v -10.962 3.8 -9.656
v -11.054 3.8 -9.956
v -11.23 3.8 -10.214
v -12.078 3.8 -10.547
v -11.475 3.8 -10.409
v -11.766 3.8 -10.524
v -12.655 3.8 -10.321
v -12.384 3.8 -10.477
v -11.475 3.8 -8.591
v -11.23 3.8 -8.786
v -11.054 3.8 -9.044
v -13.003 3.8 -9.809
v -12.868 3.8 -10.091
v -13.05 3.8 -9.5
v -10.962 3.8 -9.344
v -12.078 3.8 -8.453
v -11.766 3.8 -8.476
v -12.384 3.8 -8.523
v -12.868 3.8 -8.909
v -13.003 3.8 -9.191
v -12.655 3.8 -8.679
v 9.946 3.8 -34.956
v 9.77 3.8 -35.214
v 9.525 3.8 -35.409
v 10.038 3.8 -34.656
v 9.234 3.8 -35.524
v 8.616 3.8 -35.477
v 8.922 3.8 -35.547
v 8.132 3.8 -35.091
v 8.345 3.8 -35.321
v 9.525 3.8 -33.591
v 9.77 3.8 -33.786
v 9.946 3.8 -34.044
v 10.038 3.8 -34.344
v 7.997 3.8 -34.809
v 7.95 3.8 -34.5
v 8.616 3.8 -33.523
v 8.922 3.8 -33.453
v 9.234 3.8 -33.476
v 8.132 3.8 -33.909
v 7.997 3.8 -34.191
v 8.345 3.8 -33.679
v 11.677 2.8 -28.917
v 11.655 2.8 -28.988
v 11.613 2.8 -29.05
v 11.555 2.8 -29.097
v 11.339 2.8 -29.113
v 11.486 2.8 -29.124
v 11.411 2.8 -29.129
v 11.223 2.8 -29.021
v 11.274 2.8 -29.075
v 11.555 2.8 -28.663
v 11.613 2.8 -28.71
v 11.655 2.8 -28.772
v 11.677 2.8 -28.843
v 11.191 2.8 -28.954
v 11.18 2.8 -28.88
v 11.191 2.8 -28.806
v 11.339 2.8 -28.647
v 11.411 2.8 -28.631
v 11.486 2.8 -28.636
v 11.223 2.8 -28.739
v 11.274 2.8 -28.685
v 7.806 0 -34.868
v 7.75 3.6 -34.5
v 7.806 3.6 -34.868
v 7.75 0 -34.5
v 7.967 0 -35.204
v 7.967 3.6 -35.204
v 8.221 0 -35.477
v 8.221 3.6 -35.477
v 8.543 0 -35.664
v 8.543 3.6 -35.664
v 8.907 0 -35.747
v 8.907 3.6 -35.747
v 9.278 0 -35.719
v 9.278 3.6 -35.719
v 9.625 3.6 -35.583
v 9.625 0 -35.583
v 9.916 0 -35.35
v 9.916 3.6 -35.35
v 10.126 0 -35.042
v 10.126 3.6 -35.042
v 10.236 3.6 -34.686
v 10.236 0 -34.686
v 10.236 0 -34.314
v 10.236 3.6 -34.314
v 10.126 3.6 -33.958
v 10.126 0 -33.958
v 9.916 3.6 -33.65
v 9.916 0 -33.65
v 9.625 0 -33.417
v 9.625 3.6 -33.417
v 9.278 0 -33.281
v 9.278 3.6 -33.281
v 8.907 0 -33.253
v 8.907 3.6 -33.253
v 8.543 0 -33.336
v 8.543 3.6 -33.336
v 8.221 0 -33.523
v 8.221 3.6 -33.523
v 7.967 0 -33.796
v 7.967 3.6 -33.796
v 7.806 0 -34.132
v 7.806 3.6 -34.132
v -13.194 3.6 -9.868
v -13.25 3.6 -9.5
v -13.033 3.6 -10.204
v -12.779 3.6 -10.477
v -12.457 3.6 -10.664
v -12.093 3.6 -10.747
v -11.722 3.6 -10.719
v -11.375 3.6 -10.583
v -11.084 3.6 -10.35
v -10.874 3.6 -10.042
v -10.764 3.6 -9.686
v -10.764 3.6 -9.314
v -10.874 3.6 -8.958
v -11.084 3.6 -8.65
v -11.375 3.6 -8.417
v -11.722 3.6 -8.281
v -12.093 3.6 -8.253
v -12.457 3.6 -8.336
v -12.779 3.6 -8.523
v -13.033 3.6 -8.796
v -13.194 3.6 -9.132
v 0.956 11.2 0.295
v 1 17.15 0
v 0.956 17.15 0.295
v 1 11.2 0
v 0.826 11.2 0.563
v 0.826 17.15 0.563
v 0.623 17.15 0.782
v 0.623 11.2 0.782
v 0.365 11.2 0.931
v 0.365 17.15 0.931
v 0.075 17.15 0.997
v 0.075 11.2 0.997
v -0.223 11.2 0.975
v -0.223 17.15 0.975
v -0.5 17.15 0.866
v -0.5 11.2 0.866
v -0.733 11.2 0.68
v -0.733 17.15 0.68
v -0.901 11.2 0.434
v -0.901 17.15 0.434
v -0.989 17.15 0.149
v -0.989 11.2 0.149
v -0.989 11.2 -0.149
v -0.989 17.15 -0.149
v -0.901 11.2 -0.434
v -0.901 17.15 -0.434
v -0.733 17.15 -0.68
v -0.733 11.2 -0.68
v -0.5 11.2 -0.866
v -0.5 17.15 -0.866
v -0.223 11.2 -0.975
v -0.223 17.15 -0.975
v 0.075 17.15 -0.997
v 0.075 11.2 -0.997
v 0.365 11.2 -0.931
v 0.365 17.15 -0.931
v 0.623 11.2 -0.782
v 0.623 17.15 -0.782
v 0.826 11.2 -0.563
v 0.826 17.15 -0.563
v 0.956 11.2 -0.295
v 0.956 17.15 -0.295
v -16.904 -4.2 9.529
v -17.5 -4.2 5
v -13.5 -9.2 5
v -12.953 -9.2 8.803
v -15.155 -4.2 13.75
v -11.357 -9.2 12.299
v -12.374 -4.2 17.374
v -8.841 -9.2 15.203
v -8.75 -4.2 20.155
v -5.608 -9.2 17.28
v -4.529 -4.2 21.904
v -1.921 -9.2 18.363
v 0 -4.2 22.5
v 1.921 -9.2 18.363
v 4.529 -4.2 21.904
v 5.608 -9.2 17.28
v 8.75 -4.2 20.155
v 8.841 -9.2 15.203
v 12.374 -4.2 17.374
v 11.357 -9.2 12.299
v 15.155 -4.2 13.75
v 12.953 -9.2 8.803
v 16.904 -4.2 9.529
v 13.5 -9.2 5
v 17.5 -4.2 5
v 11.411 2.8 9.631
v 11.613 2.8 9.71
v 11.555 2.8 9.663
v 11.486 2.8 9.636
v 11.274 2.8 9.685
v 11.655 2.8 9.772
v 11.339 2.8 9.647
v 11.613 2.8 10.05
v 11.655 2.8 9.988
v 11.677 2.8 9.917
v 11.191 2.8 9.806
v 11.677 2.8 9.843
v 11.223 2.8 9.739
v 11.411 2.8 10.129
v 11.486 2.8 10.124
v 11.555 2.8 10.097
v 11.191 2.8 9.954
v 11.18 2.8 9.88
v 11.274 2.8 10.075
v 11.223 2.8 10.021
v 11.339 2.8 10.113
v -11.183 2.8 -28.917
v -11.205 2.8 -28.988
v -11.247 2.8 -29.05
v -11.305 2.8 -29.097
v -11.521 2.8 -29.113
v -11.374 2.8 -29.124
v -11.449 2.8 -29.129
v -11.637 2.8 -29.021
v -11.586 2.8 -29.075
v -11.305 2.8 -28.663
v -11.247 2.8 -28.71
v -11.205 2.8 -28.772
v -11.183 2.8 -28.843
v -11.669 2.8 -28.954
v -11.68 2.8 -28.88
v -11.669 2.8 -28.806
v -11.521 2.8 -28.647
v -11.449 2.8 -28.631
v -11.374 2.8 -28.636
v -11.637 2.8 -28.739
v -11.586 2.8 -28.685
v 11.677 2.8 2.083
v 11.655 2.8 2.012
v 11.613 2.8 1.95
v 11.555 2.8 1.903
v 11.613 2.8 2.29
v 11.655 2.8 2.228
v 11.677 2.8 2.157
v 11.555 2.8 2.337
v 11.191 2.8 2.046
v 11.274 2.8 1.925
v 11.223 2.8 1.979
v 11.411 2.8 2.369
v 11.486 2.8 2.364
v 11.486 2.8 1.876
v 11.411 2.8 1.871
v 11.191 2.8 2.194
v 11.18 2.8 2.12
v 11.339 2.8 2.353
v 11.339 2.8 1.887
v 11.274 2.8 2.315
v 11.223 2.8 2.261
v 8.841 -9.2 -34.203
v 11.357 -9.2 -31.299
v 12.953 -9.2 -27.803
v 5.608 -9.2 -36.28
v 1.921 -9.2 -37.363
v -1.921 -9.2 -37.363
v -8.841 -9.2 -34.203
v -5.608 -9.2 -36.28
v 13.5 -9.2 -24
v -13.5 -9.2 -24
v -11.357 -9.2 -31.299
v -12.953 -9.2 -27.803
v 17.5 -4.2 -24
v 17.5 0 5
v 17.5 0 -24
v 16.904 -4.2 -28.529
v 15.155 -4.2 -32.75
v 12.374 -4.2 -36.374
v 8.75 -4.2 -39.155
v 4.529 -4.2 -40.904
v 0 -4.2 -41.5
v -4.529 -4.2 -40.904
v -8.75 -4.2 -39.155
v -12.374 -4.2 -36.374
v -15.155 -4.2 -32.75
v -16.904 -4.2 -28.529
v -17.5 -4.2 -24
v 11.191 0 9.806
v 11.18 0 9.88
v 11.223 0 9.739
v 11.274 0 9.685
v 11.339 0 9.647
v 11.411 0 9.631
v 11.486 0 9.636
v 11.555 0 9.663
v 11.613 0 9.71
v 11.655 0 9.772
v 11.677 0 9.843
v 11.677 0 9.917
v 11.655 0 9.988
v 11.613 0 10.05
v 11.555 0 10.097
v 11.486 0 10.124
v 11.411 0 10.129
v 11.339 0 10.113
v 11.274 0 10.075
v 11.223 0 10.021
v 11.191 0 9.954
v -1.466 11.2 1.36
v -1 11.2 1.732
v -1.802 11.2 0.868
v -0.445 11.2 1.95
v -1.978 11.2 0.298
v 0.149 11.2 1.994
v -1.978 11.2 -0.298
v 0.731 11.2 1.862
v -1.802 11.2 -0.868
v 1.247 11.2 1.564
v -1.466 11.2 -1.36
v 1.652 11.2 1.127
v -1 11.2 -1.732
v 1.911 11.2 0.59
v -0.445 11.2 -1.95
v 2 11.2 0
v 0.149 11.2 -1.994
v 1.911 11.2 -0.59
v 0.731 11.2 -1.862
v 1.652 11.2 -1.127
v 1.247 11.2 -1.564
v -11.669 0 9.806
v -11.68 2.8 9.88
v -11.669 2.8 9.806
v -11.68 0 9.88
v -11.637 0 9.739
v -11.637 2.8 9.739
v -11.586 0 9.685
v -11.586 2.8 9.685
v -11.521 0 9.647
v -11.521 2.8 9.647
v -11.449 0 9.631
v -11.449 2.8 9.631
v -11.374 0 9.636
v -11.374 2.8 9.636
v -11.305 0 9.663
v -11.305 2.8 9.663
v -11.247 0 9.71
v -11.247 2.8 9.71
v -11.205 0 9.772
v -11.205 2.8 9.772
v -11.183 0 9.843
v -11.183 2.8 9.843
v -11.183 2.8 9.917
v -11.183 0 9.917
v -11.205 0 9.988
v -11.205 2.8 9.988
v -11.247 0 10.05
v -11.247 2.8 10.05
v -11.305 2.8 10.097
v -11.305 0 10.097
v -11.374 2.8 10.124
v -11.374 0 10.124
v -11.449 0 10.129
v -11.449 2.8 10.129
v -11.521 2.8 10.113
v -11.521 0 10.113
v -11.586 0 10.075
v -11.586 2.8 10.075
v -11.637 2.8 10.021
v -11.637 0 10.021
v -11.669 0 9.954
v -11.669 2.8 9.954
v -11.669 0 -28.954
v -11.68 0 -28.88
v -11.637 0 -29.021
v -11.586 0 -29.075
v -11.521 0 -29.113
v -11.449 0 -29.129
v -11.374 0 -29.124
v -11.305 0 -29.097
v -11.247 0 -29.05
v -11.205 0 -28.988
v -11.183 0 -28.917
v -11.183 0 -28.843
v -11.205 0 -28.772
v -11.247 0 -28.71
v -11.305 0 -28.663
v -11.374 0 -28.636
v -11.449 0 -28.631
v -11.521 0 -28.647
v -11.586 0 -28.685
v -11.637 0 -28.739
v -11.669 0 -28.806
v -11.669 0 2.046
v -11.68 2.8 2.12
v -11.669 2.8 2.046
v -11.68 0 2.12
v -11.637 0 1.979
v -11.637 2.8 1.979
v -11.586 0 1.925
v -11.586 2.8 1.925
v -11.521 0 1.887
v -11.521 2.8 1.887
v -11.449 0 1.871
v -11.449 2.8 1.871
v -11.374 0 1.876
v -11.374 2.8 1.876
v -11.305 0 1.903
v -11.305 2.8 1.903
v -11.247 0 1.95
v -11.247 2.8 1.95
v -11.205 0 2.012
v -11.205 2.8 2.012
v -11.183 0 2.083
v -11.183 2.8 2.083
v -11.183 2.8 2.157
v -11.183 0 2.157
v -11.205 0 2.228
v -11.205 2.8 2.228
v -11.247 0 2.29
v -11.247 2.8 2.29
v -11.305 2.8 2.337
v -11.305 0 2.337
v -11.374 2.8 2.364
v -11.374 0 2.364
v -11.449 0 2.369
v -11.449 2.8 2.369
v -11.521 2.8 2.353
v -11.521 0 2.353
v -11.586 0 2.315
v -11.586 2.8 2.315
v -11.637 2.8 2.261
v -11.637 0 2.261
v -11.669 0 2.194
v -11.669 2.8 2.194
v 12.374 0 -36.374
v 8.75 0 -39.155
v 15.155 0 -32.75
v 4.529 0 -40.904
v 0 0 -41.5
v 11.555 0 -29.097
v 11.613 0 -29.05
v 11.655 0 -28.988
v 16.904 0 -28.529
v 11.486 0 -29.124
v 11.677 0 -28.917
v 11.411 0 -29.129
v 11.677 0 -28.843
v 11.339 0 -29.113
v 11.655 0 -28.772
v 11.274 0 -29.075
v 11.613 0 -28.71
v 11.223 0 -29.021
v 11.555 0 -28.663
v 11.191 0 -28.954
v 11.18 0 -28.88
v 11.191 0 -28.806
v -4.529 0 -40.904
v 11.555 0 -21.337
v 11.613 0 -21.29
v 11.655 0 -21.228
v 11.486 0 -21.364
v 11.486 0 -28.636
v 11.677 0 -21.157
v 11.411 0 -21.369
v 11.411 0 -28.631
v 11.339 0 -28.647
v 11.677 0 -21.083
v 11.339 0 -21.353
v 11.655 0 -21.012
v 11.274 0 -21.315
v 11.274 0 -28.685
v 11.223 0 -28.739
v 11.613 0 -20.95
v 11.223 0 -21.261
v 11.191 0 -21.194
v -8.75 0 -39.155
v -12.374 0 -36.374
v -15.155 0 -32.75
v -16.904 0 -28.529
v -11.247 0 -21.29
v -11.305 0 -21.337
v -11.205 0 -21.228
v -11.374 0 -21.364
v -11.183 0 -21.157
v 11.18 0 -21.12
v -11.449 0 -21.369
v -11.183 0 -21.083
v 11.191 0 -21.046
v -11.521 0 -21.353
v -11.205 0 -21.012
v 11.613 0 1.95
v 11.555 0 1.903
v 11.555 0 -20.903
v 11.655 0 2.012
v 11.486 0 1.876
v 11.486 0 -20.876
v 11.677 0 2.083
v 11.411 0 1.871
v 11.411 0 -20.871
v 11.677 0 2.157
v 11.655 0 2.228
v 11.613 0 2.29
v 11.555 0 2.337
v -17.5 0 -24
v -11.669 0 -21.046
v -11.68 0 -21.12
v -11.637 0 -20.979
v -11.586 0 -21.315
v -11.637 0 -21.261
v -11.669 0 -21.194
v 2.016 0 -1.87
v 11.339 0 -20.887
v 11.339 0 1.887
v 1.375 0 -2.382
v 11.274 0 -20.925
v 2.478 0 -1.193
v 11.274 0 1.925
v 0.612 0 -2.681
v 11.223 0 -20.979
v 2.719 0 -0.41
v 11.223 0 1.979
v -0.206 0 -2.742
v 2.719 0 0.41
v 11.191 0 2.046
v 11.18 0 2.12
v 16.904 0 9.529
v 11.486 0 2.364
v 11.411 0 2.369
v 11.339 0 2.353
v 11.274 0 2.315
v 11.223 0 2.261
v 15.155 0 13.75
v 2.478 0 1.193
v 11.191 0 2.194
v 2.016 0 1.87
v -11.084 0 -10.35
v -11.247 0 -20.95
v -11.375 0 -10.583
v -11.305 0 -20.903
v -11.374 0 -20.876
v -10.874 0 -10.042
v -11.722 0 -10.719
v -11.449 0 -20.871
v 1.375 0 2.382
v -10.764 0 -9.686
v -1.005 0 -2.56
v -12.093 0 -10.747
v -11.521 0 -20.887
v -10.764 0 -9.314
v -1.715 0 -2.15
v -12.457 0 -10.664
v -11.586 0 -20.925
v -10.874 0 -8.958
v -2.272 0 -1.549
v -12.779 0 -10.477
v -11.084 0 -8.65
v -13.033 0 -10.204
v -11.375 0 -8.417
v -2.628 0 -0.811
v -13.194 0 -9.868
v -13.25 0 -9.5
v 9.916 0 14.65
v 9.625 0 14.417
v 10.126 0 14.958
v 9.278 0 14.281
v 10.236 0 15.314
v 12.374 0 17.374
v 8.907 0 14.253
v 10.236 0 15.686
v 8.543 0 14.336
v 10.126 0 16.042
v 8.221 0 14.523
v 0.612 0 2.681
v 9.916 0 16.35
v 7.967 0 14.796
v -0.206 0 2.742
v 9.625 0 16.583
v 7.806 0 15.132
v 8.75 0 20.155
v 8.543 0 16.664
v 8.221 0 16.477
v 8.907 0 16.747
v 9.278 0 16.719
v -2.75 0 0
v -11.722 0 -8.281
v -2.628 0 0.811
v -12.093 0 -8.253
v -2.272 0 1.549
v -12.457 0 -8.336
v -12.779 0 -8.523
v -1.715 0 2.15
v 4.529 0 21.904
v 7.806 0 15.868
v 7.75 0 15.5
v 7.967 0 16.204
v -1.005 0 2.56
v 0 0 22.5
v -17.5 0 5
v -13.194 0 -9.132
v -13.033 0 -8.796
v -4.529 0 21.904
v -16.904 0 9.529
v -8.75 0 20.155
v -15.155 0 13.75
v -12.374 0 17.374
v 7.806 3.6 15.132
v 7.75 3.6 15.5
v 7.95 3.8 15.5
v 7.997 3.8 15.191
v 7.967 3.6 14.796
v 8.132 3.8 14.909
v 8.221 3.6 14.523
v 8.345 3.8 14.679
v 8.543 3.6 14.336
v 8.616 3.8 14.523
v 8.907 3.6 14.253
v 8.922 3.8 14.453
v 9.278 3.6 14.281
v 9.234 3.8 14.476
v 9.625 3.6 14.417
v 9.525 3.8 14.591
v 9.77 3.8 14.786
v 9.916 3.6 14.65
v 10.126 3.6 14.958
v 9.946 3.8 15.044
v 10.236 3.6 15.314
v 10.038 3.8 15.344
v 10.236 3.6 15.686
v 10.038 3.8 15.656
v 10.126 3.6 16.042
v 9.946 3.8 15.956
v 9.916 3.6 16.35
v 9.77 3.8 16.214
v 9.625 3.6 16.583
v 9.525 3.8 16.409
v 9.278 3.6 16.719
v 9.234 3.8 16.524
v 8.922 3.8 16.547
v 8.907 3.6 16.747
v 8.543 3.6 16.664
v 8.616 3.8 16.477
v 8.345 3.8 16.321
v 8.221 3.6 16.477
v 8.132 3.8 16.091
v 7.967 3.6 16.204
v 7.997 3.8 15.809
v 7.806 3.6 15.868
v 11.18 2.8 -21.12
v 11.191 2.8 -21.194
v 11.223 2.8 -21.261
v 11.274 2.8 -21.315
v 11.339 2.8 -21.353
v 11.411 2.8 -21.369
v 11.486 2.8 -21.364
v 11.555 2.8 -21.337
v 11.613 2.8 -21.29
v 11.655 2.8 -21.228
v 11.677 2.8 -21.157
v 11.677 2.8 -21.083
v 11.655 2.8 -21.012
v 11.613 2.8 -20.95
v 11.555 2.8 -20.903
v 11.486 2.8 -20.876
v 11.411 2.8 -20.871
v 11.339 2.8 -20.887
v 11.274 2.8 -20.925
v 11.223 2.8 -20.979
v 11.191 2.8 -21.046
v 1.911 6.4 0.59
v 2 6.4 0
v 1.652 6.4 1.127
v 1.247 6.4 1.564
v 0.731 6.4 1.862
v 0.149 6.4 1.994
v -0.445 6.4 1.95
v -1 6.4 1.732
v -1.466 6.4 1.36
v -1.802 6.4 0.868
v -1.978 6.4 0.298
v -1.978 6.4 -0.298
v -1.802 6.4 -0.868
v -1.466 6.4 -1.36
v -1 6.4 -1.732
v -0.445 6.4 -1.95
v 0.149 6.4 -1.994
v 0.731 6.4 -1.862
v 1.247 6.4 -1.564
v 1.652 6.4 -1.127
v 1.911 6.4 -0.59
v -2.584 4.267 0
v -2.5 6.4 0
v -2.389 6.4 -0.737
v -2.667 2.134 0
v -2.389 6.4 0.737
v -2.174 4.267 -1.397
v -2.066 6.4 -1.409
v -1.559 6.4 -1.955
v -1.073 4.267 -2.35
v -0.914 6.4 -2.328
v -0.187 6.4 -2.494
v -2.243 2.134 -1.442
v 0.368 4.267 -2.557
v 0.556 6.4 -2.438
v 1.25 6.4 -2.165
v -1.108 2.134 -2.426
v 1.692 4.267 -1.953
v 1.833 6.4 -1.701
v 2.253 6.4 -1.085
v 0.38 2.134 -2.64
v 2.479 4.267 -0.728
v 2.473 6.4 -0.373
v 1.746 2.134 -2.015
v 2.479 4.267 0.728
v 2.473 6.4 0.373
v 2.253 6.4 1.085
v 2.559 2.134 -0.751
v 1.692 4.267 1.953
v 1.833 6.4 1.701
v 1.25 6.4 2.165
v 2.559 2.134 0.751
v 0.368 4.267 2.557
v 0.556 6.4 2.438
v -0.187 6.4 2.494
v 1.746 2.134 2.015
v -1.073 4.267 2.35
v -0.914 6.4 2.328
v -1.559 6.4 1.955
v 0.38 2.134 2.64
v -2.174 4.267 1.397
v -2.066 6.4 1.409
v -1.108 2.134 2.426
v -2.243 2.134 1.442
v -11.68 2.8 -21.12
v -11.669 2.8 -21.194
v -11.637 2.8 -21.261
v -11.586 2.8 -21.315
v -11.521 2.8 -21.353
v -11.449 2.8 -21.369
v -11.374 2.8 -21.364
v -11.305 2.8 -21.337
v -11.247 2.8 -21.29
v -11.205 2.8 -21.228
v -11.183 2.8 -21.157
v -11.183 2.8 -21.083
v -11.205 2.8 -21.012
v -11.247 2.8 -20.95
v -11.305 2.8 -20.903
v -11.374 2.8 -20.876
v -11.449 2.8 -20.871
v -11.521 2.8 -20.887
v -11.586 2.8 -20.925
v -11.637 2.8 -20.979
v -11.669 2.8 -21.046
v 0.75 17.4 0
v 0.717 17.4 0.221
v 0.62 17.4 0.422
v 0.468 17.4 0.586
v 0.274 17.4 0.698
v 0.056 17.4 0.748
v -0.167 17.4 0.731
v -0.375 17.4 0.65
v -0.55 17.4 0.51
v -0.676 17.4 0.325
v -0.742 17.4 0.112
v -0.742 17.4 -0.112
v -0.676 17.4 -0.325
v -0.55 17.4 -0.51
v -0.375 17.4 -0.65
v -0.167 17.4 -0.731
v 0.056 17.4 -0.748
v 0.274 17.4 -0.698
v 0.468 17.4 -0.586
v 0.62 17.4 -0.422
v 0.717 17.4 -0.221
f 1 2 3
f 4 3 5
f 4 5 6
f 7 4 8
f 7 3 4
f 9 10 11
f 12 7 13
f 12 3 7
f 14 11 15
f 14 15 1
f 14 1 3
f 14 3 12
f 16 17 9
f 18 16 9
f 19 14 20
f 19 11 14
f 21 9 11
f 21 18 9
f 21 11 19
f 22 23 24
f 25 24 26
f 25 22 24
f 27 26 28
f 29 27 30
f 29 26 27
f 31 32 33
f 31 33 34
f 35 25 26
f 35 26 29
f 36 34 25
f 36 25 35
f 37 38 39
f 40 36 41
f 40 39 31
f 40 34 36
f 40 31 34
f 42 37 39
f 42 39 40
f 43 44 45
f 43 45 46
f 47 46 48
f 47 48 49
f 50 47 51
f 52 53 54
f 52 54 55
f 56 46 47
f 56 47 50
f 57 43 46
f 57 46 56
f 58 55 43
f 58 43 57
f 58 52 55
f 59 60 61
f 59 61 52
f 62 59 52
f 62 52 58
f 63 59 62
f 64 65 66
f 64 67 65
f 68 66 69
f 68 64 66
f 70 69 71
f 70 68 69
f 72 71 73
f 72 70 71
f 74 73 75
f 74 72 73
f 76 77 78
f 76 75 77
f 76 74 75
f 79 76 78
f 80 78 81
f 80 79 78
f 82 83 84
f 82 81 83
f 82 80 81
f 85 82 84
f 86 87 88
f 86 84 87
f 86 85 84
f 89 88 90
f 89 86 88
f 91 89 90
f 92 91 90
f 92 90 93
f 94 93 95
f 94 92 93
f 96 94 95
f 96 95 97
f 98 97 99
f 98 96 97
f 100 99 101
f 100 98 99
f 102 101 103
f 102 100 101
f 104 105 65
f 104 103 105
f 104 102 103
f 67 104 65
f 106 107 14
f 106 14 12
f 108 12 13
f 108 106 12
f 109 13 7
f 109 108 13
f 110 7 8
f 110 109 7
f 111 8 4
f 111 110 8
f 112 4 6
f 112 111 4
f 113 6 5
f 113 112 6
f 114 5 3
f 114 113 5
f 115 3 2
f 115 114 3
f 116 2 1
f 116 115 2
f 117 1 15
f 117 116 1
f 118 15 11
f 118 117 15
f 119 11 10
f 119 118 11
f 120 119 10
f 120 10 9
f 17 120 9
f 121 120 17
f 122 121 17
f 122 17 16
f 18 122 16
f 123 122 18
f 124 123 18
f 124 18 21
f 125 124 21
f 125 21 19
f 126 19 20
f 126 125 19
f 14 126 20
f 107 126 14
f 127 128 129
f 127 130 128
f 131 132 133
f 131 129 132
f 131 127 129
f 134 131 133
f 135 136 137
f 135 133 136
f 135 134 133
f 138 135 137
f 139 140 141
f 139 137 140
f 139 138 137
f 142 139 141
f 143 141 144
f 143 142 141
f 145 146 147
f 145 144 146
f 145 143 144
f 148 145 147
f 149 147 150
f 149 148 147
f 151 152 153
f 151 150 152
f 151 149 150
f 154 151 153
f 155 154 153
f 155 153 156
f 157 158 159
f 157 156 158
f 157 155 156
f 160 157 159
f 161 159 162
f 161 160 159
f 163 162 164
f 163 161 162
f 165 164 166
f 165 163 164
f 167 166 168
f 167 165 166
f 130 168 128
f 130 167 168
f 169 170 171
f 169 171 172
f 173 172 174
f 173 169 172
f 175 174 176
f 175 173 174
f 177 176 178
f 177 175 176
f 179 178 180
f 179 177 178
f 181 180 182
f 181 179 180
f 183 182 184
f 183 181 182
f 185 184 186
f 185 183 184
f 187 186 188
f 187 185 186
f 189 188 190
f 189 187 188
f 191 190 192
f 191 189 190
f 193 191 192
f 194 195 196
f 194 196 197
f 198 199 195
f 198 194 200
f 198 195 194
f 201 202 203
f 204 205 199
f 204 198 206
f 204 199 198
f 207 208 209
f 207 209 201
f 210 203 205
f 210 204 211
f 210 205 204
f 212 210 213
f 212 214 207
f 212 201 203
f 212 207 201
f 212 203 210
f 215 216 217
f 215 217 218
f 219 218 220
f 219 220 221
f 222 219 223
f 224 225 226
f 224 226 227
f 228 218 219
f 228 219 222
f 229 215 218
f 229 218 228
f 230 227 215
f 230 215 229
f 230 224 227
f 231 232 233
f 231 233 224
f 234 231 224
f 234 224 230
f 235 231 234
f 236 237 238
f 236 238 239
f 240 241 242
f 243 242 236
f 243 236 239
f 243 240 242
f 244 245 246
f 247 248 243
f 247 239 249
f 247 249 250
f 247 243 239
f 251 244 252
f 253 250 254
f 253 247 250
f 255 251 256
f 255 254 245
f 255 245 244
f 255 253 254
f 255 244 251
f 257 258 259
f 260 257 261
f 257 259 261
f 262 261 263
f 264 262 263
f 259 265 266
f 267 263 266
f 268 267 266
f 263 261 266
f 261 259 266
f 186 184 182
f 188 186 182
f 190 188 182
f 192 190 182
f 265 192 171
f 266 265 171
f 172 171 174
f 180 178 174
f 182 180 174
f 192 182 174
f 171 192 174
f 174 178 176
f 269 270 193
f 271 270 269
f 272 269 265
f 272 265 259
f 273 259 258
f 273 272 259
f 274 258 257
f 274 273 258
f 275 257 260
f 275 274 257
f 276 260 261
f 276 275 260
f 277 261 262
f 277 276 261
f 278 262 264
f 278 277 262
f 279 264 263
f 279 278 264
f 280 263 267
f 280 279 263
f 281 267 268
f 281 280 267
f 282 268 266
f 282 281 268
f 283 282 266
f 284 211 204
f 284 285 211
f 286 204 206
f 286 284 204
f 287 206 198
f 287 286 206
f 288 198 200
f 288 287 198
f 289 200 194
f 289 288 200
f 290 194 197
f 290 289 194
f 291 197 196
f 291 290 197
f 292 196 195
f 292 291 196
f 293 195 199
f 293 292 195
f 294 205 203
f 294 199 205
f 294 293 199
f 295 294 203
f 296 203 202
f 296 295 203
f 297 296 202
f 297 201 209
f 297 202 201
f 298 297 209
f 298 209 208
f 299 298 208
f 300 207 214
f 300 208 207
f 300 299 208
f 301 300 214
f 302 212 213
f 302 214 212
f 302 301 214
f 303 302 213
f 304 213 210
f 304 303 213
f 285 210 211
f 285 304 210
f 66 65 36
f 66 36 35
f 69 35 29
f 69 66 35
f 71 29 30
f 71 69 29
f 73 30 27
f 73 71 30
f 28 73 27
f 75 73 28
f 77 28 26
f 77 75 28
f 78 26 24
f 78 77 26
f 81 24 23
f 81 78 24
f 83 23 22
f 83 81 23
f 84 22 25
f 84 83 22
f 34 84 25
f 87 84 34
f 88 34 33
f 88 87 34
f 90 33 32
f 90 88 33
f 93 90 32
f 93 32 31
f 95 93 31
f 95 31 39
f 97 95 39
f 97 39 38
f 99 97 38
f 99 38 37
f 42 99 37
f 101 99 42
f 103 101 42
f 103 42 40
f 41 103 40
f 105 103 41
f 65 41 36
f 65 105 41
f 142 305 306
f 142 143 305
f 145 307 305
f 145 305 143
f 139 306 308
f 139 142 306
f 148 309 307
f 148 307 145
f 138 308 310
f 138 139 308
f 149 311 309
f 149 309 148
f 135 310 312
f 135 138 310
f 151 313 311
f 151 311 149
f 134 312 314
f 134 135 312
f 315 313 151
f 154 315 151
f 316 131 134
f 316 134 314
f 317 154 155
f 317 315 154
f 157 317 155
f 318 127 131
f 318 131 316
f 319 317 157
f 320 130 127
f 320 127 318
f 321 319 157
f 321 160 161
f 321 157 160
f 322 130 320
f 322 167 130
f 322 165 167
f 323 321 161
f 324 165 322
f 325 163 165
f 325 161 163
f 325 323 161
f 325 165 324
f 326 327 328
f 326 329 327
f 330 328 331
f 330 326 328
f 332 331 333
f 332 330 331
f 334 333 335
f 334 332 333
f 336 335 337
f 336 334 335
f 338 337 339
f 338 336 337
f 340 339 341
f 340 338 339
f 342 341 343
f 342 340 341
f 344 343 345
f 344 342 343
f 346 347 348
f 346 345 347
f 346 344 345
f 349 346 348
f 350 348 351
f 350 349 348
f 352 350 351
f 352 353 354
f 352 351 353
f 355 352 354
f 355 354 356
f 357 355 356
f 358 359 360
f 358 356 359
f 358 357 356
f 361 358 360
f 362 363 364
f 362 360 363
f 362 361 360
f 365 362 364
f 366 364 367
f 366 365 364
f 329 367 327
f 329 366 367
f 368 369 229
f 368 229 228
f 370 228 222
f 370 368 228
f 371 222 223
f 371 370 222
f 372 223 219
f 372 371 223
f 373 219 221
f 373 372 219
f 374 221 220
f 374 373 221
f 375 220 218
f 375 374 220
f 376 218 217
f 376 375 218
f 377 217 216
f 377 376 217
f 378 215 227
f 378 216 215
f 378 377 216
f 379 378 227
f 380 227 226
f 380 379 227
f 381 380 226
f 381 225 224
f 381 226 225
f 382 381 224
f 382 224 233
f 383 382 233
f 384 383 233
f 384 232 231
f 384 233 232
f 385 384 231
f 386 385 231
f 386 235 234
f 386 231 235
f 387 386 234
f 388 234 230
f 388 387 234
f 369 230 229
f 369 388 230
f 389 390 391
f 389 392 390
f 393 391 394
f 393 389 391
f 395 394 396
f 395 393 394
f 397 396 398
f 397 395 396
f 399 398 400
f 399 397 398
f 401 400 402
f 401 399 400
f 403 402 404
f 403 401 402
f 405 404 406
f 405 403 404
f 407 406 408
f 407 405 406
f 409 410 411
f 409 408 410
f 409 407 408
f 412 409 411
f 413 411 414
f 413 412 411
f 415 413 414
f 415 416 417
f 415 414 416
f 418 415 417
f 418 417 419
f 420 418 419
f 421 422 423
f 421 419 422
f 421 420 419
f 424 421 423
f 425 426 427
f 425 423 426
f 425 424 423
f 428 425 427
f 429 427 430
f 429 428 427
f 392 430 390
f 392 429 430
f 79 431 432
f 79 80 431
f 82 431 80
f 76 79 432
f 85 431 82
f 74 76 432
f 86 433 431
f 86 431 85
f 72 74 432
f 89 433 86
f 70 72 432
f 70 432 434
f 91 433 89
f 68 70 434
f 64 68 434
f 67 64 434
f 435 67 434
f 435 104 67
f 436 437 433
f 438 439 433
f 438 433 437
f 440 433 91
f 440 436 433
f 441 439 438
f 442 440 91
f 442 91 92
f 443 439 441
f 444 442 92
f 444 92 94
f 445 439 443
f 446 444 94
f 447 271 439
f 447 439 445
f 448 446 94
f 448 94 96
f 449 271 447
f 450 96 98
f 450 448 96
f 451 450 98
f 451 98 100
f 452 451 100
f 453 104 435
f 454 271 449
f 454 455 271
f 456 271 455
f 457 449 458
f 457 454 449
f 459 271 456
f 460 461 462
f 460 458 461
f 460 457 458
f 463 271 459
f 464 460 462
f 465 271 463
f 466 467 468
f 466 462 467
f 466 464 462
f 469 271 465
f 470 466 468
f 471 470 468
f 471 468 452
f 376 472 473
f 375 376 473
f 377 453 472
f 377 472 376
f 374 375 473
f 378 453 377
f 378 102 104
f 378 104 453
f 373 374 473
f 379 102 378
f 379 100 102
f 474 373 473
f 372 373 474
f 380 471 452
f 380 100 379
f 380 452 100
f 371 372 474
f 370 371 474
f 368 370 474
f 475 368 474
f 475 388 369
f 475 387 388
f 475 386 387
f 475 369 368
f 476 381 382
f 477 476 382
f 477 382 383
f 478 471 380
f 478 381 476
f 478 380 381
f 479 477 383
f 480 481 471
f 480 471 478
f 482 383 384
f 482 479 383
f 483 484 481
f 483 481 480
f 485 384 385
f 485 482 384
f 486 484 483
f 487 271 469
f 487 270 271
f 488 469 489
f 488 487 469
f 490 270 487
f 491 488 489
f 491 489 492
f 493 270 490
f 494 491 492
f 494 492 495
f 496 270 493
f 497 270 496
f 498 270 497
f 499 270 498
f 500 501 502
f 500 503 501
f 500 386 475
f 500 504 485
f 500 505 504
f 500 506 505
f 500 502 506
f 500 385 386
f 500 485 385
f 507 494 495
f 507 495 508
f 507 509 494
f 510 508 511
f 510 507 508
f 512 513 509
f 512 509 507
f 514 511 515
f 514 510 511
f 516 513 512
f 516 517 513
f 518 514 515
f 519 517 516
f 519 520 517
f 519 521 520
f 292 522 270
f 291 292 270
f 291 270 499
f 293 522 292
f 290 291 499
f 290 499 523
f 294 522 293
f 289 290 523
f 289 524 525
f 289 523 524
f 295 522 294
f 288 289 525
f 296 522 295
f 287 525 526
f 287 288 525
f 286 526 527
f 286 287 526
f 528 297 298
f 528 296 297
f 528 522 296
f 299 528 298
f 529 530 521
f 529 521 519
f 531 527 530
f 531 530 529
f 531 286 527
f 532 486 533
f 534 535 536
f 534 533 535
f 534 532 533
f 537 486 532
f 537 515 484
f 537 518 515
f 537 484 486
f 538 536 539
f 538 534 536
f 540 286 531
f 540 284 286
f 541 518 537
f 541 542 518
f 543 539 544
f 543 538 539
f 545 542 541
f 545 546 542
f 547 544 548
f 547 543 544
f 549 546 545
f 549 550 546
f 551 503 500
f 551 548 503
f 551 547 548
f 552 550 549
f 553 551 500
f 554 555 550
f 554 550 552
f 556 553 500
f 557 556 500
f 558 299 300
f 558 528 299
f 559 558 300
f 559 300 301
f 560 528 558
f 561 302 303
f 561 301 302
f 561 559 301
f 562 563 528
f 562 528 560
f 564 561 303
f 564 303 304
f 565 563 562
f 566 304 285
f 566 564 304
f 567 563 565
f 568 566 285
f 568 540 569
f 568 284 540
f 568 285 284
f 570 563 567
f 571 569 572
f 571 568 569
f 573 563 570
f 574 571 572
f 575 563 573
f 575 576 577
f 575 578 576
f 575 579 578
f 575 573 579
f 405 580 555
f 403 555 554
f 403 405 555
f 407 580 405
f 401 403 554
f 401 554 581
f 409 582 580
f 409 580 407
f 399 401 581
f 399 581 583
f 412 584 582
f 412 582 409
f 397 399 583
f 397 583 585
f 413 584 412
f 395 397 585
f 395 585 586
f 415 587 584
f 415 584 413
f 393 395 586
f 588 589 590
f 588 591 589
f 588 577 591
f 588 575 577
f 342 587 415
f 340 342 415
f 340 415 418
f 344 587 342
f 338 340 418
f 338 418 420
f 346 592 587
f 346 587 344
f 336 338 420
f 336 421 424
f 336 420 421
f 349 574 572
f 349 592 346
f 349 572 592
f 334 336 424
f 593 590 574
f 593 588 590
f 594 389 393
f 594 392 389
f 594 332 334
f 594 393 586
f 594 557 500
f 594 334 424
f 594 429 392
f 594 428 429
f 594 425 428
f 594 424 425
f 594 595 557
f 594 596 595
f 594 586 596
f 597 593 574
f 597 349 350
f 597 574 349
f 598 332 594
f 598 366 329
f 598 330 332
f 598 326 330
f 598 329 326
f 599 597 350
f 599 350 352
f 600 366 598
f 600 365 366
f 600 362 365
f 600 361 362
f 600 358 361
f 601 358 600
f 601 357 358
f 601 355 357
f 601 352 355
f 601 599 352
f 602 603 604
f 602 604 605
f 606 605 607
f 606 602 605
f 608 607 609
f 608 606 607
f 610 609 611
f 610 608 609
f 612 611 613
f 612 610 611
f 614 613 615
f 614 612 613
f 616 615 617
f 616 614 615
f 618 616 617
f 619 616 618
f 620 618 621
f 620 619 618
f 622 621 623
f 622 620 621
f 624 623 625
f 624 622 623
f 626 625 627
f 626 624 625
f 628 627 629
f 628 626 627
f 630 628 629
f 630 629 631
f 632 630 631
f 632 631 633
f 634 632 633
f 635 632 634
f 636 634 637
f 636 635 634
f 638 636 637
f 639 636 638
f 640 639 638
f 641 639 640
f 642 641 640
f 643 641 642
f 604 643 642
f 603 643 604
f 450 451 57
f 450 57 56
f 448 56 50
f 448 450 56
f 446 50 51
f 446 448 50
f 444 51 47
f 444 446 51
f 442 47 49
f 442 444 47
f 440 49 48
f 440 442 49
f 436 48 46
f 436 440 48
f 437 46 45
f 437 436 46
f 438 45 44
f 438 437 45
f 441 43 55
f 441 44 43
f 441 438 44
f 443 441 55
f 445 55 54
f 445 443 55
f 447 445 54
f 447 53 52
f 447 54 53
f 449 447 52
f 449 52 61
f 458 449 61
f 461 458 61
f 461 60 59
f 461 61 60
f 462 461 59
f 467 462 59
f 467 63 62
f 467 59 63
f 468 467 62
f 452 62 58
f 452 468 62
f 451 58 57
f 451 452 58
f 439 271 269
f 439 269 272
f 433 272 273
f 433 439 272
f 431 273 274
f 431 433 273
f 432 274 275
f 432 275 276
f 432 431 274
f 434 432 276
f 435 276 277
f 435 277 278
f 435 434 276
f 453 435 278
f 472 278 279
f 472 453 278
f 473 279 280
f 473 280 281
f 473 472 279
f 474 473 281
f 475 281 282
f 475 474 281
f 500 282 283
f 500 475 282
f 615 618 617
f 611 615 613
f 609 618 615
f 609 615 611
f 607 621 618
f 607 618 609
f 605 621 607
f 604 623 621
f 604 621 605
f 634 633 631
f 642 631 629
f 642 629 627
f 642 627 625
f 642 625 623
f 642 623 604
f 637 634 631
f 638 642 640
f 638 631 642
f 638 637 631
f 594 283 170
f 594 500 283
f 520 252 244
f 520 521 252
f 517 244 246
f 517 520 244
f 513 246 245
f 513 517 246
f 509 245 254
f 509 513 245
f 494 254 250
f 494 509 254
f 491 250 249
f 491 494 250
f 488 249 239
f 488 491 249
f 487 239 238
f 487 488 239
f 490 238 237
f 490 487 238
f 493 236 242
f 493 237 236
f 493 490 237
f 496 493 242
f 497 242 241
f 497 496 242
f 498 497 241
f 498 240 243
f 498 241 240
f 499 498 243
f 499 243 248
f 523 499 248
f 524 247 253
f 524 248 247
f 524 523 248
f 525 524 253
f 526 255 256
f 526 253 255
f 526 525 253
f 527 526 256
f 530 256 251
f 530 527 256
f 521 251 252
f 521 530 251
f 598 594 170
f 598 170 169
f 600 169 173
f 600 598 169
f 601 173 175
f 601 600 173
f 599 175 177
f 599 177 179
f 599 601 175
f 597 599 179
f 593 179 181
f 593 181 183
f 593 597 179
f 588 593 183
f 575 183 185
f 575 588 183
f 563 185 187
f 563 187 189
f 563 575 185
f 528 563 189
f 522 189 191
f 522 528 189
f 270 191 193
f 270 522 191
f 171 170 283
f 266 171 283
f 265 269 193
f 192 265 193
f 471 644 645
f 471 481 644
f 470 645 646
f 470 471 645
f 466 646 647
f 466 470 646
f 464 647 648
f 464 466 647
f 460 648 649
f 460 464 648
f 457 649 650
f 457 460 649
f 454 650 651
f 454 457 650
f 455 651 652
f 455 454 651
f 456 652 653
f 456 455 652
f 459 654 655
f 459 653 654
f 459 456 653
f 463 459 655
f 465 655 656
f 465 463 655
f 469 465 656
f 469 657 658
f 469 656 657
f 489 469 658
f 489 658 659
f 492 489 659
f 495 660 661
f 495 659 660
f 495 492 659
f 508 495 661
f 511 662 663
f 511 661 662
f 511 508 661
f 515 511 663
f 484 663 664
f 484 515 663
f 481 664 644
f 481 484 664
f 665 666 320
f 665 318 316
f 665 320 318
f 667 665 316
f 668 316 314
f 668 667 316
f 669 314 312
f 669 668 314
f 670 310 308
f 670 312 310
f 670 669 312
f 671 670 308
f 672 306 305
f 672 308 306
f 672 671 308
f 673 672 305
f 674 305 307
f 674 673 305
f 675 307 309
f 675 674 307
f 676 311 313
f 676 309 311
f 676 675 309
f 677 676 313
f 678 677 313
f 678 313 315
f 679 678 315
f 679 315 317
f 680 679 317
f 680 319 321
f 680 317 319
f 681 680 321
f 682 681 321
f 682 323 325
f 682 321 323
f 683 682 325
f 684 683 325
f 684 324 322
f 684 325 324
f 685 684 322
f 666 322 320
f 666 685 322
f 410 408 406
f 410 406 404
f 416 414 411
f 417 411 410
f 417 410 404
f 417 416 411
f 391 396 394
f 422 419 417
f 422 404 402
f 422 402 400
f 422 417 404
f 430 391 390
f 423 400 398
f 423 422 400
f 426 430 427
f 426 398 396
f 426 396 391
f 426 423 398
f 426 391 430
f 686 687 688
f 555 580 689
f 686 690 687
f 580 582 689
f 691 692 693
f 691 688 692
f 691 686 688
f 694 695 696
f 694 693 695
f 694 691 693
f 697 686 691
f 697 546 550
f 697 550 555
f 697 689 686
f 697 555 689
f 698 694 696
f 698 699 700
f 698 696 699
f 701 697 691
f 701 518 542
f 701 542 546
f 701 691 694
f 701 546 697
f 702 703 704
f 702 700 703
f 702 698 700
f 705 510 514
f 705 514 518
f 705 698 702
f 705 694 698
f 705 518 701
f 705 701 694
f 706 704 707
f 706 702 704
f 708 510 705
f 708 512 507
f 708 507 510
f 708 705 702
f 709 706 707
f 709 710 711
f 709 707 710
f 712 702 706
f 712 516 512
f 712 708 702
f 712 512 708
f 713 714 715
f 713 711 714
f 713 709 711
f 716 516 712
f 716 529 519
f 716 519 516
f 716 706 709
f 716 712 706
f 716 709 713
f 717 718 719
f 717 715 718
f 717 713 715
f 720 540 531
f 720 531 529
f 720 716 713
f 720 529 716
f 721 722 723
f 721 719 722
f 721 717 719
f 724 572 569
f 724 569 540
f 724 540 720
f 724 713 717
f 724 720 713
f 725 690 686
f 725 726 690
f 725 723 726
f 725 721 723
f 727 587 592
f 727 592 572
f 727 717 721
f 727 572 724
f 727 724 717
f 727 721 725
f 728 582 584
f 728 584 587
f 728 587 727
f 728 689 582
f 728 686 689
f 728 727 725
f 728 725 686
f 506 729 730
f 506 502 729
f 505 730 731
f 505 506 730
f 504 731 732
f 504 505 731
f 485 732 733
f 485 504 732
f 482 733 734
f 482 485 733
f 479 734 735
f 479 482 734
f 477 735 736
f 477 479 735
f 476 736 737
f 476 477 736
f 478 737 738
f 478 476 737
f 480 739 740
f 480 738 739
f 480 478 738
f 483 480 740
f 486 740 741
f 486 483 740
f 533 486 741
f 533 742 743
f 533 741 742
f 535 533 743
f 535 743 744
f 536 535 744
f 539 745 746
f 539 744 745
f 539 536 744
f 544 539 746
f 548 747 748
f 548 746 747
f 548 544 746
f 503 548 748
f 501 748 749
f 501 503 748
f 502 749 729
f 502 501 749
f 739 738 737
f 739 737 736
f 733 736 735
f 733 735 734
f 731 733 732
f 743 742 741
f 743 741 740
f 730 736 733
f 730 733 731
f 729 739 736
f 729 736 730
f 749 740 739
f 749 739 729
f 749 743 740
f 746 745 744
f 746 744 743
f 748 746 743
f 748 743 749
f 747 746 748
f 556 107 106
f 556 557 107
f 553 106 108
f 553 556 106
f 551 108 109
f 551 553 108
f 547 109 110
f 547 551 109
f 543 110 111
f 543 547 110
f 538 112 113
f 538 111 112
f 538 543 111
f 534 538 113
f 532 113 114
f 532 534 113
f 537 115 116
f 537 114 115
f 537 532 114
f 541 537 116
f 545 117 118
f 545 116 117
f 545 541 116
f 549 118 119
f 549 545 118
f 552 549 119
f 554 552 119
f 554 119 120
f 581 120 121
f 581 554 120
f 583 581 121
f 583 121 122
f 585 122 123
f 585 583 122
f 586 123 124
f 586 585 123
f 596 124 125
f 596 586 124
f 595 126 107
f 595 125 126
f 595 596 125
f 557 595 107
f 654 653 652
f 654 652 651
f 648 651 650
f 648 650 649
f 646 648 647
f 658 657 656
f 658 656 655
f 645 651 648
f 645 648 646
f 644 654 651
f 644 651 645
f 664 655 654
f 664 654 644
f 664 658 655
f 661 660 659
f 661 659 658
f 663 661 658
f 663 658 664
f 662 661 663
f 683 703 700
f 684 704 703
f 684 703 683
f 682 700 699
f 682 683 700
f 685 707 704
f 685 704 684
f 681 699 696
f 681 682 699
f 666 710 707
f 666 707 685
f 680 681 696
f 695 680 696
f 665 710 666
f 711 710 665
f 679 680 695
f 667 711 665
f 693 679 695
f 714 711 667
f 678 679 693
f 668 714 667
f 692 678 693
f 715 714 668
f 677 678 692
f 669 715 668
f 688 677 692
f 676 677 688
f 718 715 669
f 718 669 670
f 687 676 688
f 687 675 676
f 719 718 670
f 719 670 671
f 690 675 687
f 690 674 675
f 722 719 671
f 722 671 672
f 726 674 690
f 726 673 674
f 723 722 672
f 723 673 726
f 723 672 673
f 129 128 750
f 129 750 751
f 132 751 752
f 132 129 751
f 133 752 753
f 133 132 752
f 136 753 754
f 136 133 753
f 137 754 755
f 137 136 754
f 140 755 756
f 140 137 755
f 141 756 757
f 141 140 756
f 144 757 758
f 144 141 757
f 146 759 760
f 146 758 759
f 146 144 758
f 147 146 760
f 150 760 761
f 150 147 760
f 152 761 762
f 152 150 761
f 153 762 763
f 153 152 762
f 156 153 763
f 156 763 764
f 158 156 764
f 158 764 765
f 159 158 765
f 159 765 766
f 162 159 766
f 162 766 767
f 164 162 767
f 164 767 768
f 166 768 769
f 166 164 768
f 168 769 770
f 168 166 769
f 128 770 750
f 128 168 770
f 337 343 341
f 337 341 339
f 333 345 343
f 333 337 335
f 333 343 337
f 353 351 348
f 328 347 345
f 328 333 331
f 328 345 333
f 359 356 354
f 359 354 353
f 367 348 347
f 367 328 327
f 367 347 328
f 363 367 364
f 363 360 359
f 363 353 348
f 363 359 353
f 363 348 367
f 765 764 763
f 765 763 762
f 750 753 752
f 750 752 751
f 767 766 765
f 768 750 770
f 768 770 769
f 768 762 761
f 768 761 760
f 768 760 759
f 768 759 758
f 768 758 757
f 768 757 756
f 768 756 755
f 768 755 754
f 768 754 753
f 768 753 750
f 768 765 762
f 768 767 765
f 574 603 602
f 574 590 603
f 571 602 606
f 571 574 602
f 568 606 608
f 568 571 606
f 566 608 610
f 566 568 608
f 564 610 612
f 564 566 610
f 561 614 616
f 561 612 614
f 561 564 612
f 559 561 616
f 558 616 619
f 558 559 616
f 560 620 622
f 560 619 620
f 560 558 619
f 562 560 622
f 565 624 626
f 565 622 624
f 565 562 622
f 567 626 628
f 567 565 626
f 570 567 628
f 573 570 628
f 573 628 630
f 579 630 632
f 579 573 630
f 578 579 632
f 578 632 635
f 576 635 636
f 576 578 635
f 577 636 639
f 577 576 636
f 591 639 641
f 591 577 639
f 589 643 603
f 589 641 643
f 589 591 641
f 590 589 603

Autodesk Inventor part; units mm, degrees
ref_plane "YZ Plane" through (0, 0, 0) normal (1, 0, 0) x (0, 1, 0)
ref_plane "XZ Plane" through (0, 0, 0) normal (0, 1, 0) x (-1, 0, 0)
ref_plane "XY Plane" through (0, 0, 0) normal (0, 0, 1) x (1, 0, 0)
sketch "Sketch1" plane through (0, 0, 0) normal (0, 1, 0) x (-1, 0, 0)
  circle A0 centre (-11.43, -21.12) radius 0.25
  circle A1 centre (-11.43, -28.88) radius 0.25
  circle A2 centre (-9, -34.5) radius 1.25
  line L0 (11.43, -28.88) -> (-11.43, -28.88) construction
  circle A3 centre (11.43, -21.12) radius 0.25
  circle A4 centre (11.43, -28.88) radius 0.25
  arc A5 (-17.5, -24) -> (17.5, -24) centre (0, -24) ccw
  circle A6 centre (11.43, 2.12) radius 0.25
  circle A7 centre (-11.43, 9.88) radius 0.25
  circle A8 centre (11.43, 9.88) radius 0.25
  circle A9 centre (-9, 15.5) radius 1.25
  arc A10 (17.5, 5) -> (-17.5, 5) centre (0, 5) ccw
  circle A11 centre (-11.43, 2.12) radius 0.25
  circle A12 centre (12, -9.5) radius 1.25
  line L1 (17.5, -24) -> (17.5, 5)
  line L2 (11.43, -21.12) -> (11.43, 2.12) construction
  line L3 (0, -24) -> (0, 5) construction
  line L4 (-17.5, 5) -> (-17.5, -24)
  line L5 (-9, -34.5) -> (-9, 15.5) construction
  circle A13 centre (0, 0) radius 2.75
  point P0 (0, -41.5)
  point P1 (0, -28.88)
  point P2 (0, 22.5)
  point P3 (-9, -9.5)
  point P4 (11.43, -9.5)
  point P5 (0, -9.5)
  dimension "d0" = 17.5
  dimension "d2" = 5.5
  dimension "d3" = 64
  dimension "d4" = 2.5
  dimension "d5" = 12
  dimension "d6" = 50
  dimension "d7" = 9
  dimension "d8" = 22.86
  dimension "d9" = 7.76
  dimension "d10" = 7.76
  dimension "d11" = 23.24
  dimension "d12" = 0.5
  dimension "d13" = 9.5
extrude "Extrusion1" add sketch "Sketch1" against normal blind 9.2 contours A0 | A1 | A2 | A3 | A4 | L4 A10 L1 A5 | A6 | A7 | A8 | A9 | A11 | A12 | A13
chamfer "Chamfer1" distance 4 distance2 5 4 edges at (0, -9.2, 22.5) (-17.5, -9.2, -9.5) (0, -9.2, -41.5) (17.5, -9.2, -9.5) measured on face at (-5.8333, -9.2, -14.3333)
extrude "Extrusion2" add sketch "Sketch1" along normal blind 2.8 contours A0 | A1 | A3 | A4 | A6 | A7 | A8 | A11
extrude "Extrusion3" add sketch "Sketch1" along normal blind 3.8 contours A2 | A9 | A12
chamfer "Chamfer2" distance 0.2 angle 45 3 edges at (-10.75, 3.8, -9.5) (10.25, 3.8, 15.5) (10.25, 3.8, -34.5)
extrude "Extrusion4" add sketch "Sketch1" along normal blind 6.4 contours A13
chamfer "Chamfer3" distance 0.25 distance2 6.4 1 edges at (2.75, 6.4, 0) measured on face at (-0.9684, 6.4, -0.426)
sketch "Sketch3" plane through (0, 6.4, 0) normal (0, 1, 0) x (1, 0, 0)
  circle A0 centre (0, 0) radius 2
  dimension "d31" = 4
extrude "Extrusion5" add sketch "Sketch3" along normal blind 4.8
sketch "Sketch4" plane through (0, 11.2, 0) normal (0, 1, 0) x (1, 0, 0)
  circle A0 centre (0, 0) radius 1
  dimension "d34" = 2
extrude "Extrusion6" add sketch "Sketch4" along normal blind 6.2
chamfer "Chamfer4" distance 0.25 angle 45 1 edges at (-1, 17.4, 0)
equation "\"d10\" = d9"
properties part number "BKA" material "ABS Plastic"
